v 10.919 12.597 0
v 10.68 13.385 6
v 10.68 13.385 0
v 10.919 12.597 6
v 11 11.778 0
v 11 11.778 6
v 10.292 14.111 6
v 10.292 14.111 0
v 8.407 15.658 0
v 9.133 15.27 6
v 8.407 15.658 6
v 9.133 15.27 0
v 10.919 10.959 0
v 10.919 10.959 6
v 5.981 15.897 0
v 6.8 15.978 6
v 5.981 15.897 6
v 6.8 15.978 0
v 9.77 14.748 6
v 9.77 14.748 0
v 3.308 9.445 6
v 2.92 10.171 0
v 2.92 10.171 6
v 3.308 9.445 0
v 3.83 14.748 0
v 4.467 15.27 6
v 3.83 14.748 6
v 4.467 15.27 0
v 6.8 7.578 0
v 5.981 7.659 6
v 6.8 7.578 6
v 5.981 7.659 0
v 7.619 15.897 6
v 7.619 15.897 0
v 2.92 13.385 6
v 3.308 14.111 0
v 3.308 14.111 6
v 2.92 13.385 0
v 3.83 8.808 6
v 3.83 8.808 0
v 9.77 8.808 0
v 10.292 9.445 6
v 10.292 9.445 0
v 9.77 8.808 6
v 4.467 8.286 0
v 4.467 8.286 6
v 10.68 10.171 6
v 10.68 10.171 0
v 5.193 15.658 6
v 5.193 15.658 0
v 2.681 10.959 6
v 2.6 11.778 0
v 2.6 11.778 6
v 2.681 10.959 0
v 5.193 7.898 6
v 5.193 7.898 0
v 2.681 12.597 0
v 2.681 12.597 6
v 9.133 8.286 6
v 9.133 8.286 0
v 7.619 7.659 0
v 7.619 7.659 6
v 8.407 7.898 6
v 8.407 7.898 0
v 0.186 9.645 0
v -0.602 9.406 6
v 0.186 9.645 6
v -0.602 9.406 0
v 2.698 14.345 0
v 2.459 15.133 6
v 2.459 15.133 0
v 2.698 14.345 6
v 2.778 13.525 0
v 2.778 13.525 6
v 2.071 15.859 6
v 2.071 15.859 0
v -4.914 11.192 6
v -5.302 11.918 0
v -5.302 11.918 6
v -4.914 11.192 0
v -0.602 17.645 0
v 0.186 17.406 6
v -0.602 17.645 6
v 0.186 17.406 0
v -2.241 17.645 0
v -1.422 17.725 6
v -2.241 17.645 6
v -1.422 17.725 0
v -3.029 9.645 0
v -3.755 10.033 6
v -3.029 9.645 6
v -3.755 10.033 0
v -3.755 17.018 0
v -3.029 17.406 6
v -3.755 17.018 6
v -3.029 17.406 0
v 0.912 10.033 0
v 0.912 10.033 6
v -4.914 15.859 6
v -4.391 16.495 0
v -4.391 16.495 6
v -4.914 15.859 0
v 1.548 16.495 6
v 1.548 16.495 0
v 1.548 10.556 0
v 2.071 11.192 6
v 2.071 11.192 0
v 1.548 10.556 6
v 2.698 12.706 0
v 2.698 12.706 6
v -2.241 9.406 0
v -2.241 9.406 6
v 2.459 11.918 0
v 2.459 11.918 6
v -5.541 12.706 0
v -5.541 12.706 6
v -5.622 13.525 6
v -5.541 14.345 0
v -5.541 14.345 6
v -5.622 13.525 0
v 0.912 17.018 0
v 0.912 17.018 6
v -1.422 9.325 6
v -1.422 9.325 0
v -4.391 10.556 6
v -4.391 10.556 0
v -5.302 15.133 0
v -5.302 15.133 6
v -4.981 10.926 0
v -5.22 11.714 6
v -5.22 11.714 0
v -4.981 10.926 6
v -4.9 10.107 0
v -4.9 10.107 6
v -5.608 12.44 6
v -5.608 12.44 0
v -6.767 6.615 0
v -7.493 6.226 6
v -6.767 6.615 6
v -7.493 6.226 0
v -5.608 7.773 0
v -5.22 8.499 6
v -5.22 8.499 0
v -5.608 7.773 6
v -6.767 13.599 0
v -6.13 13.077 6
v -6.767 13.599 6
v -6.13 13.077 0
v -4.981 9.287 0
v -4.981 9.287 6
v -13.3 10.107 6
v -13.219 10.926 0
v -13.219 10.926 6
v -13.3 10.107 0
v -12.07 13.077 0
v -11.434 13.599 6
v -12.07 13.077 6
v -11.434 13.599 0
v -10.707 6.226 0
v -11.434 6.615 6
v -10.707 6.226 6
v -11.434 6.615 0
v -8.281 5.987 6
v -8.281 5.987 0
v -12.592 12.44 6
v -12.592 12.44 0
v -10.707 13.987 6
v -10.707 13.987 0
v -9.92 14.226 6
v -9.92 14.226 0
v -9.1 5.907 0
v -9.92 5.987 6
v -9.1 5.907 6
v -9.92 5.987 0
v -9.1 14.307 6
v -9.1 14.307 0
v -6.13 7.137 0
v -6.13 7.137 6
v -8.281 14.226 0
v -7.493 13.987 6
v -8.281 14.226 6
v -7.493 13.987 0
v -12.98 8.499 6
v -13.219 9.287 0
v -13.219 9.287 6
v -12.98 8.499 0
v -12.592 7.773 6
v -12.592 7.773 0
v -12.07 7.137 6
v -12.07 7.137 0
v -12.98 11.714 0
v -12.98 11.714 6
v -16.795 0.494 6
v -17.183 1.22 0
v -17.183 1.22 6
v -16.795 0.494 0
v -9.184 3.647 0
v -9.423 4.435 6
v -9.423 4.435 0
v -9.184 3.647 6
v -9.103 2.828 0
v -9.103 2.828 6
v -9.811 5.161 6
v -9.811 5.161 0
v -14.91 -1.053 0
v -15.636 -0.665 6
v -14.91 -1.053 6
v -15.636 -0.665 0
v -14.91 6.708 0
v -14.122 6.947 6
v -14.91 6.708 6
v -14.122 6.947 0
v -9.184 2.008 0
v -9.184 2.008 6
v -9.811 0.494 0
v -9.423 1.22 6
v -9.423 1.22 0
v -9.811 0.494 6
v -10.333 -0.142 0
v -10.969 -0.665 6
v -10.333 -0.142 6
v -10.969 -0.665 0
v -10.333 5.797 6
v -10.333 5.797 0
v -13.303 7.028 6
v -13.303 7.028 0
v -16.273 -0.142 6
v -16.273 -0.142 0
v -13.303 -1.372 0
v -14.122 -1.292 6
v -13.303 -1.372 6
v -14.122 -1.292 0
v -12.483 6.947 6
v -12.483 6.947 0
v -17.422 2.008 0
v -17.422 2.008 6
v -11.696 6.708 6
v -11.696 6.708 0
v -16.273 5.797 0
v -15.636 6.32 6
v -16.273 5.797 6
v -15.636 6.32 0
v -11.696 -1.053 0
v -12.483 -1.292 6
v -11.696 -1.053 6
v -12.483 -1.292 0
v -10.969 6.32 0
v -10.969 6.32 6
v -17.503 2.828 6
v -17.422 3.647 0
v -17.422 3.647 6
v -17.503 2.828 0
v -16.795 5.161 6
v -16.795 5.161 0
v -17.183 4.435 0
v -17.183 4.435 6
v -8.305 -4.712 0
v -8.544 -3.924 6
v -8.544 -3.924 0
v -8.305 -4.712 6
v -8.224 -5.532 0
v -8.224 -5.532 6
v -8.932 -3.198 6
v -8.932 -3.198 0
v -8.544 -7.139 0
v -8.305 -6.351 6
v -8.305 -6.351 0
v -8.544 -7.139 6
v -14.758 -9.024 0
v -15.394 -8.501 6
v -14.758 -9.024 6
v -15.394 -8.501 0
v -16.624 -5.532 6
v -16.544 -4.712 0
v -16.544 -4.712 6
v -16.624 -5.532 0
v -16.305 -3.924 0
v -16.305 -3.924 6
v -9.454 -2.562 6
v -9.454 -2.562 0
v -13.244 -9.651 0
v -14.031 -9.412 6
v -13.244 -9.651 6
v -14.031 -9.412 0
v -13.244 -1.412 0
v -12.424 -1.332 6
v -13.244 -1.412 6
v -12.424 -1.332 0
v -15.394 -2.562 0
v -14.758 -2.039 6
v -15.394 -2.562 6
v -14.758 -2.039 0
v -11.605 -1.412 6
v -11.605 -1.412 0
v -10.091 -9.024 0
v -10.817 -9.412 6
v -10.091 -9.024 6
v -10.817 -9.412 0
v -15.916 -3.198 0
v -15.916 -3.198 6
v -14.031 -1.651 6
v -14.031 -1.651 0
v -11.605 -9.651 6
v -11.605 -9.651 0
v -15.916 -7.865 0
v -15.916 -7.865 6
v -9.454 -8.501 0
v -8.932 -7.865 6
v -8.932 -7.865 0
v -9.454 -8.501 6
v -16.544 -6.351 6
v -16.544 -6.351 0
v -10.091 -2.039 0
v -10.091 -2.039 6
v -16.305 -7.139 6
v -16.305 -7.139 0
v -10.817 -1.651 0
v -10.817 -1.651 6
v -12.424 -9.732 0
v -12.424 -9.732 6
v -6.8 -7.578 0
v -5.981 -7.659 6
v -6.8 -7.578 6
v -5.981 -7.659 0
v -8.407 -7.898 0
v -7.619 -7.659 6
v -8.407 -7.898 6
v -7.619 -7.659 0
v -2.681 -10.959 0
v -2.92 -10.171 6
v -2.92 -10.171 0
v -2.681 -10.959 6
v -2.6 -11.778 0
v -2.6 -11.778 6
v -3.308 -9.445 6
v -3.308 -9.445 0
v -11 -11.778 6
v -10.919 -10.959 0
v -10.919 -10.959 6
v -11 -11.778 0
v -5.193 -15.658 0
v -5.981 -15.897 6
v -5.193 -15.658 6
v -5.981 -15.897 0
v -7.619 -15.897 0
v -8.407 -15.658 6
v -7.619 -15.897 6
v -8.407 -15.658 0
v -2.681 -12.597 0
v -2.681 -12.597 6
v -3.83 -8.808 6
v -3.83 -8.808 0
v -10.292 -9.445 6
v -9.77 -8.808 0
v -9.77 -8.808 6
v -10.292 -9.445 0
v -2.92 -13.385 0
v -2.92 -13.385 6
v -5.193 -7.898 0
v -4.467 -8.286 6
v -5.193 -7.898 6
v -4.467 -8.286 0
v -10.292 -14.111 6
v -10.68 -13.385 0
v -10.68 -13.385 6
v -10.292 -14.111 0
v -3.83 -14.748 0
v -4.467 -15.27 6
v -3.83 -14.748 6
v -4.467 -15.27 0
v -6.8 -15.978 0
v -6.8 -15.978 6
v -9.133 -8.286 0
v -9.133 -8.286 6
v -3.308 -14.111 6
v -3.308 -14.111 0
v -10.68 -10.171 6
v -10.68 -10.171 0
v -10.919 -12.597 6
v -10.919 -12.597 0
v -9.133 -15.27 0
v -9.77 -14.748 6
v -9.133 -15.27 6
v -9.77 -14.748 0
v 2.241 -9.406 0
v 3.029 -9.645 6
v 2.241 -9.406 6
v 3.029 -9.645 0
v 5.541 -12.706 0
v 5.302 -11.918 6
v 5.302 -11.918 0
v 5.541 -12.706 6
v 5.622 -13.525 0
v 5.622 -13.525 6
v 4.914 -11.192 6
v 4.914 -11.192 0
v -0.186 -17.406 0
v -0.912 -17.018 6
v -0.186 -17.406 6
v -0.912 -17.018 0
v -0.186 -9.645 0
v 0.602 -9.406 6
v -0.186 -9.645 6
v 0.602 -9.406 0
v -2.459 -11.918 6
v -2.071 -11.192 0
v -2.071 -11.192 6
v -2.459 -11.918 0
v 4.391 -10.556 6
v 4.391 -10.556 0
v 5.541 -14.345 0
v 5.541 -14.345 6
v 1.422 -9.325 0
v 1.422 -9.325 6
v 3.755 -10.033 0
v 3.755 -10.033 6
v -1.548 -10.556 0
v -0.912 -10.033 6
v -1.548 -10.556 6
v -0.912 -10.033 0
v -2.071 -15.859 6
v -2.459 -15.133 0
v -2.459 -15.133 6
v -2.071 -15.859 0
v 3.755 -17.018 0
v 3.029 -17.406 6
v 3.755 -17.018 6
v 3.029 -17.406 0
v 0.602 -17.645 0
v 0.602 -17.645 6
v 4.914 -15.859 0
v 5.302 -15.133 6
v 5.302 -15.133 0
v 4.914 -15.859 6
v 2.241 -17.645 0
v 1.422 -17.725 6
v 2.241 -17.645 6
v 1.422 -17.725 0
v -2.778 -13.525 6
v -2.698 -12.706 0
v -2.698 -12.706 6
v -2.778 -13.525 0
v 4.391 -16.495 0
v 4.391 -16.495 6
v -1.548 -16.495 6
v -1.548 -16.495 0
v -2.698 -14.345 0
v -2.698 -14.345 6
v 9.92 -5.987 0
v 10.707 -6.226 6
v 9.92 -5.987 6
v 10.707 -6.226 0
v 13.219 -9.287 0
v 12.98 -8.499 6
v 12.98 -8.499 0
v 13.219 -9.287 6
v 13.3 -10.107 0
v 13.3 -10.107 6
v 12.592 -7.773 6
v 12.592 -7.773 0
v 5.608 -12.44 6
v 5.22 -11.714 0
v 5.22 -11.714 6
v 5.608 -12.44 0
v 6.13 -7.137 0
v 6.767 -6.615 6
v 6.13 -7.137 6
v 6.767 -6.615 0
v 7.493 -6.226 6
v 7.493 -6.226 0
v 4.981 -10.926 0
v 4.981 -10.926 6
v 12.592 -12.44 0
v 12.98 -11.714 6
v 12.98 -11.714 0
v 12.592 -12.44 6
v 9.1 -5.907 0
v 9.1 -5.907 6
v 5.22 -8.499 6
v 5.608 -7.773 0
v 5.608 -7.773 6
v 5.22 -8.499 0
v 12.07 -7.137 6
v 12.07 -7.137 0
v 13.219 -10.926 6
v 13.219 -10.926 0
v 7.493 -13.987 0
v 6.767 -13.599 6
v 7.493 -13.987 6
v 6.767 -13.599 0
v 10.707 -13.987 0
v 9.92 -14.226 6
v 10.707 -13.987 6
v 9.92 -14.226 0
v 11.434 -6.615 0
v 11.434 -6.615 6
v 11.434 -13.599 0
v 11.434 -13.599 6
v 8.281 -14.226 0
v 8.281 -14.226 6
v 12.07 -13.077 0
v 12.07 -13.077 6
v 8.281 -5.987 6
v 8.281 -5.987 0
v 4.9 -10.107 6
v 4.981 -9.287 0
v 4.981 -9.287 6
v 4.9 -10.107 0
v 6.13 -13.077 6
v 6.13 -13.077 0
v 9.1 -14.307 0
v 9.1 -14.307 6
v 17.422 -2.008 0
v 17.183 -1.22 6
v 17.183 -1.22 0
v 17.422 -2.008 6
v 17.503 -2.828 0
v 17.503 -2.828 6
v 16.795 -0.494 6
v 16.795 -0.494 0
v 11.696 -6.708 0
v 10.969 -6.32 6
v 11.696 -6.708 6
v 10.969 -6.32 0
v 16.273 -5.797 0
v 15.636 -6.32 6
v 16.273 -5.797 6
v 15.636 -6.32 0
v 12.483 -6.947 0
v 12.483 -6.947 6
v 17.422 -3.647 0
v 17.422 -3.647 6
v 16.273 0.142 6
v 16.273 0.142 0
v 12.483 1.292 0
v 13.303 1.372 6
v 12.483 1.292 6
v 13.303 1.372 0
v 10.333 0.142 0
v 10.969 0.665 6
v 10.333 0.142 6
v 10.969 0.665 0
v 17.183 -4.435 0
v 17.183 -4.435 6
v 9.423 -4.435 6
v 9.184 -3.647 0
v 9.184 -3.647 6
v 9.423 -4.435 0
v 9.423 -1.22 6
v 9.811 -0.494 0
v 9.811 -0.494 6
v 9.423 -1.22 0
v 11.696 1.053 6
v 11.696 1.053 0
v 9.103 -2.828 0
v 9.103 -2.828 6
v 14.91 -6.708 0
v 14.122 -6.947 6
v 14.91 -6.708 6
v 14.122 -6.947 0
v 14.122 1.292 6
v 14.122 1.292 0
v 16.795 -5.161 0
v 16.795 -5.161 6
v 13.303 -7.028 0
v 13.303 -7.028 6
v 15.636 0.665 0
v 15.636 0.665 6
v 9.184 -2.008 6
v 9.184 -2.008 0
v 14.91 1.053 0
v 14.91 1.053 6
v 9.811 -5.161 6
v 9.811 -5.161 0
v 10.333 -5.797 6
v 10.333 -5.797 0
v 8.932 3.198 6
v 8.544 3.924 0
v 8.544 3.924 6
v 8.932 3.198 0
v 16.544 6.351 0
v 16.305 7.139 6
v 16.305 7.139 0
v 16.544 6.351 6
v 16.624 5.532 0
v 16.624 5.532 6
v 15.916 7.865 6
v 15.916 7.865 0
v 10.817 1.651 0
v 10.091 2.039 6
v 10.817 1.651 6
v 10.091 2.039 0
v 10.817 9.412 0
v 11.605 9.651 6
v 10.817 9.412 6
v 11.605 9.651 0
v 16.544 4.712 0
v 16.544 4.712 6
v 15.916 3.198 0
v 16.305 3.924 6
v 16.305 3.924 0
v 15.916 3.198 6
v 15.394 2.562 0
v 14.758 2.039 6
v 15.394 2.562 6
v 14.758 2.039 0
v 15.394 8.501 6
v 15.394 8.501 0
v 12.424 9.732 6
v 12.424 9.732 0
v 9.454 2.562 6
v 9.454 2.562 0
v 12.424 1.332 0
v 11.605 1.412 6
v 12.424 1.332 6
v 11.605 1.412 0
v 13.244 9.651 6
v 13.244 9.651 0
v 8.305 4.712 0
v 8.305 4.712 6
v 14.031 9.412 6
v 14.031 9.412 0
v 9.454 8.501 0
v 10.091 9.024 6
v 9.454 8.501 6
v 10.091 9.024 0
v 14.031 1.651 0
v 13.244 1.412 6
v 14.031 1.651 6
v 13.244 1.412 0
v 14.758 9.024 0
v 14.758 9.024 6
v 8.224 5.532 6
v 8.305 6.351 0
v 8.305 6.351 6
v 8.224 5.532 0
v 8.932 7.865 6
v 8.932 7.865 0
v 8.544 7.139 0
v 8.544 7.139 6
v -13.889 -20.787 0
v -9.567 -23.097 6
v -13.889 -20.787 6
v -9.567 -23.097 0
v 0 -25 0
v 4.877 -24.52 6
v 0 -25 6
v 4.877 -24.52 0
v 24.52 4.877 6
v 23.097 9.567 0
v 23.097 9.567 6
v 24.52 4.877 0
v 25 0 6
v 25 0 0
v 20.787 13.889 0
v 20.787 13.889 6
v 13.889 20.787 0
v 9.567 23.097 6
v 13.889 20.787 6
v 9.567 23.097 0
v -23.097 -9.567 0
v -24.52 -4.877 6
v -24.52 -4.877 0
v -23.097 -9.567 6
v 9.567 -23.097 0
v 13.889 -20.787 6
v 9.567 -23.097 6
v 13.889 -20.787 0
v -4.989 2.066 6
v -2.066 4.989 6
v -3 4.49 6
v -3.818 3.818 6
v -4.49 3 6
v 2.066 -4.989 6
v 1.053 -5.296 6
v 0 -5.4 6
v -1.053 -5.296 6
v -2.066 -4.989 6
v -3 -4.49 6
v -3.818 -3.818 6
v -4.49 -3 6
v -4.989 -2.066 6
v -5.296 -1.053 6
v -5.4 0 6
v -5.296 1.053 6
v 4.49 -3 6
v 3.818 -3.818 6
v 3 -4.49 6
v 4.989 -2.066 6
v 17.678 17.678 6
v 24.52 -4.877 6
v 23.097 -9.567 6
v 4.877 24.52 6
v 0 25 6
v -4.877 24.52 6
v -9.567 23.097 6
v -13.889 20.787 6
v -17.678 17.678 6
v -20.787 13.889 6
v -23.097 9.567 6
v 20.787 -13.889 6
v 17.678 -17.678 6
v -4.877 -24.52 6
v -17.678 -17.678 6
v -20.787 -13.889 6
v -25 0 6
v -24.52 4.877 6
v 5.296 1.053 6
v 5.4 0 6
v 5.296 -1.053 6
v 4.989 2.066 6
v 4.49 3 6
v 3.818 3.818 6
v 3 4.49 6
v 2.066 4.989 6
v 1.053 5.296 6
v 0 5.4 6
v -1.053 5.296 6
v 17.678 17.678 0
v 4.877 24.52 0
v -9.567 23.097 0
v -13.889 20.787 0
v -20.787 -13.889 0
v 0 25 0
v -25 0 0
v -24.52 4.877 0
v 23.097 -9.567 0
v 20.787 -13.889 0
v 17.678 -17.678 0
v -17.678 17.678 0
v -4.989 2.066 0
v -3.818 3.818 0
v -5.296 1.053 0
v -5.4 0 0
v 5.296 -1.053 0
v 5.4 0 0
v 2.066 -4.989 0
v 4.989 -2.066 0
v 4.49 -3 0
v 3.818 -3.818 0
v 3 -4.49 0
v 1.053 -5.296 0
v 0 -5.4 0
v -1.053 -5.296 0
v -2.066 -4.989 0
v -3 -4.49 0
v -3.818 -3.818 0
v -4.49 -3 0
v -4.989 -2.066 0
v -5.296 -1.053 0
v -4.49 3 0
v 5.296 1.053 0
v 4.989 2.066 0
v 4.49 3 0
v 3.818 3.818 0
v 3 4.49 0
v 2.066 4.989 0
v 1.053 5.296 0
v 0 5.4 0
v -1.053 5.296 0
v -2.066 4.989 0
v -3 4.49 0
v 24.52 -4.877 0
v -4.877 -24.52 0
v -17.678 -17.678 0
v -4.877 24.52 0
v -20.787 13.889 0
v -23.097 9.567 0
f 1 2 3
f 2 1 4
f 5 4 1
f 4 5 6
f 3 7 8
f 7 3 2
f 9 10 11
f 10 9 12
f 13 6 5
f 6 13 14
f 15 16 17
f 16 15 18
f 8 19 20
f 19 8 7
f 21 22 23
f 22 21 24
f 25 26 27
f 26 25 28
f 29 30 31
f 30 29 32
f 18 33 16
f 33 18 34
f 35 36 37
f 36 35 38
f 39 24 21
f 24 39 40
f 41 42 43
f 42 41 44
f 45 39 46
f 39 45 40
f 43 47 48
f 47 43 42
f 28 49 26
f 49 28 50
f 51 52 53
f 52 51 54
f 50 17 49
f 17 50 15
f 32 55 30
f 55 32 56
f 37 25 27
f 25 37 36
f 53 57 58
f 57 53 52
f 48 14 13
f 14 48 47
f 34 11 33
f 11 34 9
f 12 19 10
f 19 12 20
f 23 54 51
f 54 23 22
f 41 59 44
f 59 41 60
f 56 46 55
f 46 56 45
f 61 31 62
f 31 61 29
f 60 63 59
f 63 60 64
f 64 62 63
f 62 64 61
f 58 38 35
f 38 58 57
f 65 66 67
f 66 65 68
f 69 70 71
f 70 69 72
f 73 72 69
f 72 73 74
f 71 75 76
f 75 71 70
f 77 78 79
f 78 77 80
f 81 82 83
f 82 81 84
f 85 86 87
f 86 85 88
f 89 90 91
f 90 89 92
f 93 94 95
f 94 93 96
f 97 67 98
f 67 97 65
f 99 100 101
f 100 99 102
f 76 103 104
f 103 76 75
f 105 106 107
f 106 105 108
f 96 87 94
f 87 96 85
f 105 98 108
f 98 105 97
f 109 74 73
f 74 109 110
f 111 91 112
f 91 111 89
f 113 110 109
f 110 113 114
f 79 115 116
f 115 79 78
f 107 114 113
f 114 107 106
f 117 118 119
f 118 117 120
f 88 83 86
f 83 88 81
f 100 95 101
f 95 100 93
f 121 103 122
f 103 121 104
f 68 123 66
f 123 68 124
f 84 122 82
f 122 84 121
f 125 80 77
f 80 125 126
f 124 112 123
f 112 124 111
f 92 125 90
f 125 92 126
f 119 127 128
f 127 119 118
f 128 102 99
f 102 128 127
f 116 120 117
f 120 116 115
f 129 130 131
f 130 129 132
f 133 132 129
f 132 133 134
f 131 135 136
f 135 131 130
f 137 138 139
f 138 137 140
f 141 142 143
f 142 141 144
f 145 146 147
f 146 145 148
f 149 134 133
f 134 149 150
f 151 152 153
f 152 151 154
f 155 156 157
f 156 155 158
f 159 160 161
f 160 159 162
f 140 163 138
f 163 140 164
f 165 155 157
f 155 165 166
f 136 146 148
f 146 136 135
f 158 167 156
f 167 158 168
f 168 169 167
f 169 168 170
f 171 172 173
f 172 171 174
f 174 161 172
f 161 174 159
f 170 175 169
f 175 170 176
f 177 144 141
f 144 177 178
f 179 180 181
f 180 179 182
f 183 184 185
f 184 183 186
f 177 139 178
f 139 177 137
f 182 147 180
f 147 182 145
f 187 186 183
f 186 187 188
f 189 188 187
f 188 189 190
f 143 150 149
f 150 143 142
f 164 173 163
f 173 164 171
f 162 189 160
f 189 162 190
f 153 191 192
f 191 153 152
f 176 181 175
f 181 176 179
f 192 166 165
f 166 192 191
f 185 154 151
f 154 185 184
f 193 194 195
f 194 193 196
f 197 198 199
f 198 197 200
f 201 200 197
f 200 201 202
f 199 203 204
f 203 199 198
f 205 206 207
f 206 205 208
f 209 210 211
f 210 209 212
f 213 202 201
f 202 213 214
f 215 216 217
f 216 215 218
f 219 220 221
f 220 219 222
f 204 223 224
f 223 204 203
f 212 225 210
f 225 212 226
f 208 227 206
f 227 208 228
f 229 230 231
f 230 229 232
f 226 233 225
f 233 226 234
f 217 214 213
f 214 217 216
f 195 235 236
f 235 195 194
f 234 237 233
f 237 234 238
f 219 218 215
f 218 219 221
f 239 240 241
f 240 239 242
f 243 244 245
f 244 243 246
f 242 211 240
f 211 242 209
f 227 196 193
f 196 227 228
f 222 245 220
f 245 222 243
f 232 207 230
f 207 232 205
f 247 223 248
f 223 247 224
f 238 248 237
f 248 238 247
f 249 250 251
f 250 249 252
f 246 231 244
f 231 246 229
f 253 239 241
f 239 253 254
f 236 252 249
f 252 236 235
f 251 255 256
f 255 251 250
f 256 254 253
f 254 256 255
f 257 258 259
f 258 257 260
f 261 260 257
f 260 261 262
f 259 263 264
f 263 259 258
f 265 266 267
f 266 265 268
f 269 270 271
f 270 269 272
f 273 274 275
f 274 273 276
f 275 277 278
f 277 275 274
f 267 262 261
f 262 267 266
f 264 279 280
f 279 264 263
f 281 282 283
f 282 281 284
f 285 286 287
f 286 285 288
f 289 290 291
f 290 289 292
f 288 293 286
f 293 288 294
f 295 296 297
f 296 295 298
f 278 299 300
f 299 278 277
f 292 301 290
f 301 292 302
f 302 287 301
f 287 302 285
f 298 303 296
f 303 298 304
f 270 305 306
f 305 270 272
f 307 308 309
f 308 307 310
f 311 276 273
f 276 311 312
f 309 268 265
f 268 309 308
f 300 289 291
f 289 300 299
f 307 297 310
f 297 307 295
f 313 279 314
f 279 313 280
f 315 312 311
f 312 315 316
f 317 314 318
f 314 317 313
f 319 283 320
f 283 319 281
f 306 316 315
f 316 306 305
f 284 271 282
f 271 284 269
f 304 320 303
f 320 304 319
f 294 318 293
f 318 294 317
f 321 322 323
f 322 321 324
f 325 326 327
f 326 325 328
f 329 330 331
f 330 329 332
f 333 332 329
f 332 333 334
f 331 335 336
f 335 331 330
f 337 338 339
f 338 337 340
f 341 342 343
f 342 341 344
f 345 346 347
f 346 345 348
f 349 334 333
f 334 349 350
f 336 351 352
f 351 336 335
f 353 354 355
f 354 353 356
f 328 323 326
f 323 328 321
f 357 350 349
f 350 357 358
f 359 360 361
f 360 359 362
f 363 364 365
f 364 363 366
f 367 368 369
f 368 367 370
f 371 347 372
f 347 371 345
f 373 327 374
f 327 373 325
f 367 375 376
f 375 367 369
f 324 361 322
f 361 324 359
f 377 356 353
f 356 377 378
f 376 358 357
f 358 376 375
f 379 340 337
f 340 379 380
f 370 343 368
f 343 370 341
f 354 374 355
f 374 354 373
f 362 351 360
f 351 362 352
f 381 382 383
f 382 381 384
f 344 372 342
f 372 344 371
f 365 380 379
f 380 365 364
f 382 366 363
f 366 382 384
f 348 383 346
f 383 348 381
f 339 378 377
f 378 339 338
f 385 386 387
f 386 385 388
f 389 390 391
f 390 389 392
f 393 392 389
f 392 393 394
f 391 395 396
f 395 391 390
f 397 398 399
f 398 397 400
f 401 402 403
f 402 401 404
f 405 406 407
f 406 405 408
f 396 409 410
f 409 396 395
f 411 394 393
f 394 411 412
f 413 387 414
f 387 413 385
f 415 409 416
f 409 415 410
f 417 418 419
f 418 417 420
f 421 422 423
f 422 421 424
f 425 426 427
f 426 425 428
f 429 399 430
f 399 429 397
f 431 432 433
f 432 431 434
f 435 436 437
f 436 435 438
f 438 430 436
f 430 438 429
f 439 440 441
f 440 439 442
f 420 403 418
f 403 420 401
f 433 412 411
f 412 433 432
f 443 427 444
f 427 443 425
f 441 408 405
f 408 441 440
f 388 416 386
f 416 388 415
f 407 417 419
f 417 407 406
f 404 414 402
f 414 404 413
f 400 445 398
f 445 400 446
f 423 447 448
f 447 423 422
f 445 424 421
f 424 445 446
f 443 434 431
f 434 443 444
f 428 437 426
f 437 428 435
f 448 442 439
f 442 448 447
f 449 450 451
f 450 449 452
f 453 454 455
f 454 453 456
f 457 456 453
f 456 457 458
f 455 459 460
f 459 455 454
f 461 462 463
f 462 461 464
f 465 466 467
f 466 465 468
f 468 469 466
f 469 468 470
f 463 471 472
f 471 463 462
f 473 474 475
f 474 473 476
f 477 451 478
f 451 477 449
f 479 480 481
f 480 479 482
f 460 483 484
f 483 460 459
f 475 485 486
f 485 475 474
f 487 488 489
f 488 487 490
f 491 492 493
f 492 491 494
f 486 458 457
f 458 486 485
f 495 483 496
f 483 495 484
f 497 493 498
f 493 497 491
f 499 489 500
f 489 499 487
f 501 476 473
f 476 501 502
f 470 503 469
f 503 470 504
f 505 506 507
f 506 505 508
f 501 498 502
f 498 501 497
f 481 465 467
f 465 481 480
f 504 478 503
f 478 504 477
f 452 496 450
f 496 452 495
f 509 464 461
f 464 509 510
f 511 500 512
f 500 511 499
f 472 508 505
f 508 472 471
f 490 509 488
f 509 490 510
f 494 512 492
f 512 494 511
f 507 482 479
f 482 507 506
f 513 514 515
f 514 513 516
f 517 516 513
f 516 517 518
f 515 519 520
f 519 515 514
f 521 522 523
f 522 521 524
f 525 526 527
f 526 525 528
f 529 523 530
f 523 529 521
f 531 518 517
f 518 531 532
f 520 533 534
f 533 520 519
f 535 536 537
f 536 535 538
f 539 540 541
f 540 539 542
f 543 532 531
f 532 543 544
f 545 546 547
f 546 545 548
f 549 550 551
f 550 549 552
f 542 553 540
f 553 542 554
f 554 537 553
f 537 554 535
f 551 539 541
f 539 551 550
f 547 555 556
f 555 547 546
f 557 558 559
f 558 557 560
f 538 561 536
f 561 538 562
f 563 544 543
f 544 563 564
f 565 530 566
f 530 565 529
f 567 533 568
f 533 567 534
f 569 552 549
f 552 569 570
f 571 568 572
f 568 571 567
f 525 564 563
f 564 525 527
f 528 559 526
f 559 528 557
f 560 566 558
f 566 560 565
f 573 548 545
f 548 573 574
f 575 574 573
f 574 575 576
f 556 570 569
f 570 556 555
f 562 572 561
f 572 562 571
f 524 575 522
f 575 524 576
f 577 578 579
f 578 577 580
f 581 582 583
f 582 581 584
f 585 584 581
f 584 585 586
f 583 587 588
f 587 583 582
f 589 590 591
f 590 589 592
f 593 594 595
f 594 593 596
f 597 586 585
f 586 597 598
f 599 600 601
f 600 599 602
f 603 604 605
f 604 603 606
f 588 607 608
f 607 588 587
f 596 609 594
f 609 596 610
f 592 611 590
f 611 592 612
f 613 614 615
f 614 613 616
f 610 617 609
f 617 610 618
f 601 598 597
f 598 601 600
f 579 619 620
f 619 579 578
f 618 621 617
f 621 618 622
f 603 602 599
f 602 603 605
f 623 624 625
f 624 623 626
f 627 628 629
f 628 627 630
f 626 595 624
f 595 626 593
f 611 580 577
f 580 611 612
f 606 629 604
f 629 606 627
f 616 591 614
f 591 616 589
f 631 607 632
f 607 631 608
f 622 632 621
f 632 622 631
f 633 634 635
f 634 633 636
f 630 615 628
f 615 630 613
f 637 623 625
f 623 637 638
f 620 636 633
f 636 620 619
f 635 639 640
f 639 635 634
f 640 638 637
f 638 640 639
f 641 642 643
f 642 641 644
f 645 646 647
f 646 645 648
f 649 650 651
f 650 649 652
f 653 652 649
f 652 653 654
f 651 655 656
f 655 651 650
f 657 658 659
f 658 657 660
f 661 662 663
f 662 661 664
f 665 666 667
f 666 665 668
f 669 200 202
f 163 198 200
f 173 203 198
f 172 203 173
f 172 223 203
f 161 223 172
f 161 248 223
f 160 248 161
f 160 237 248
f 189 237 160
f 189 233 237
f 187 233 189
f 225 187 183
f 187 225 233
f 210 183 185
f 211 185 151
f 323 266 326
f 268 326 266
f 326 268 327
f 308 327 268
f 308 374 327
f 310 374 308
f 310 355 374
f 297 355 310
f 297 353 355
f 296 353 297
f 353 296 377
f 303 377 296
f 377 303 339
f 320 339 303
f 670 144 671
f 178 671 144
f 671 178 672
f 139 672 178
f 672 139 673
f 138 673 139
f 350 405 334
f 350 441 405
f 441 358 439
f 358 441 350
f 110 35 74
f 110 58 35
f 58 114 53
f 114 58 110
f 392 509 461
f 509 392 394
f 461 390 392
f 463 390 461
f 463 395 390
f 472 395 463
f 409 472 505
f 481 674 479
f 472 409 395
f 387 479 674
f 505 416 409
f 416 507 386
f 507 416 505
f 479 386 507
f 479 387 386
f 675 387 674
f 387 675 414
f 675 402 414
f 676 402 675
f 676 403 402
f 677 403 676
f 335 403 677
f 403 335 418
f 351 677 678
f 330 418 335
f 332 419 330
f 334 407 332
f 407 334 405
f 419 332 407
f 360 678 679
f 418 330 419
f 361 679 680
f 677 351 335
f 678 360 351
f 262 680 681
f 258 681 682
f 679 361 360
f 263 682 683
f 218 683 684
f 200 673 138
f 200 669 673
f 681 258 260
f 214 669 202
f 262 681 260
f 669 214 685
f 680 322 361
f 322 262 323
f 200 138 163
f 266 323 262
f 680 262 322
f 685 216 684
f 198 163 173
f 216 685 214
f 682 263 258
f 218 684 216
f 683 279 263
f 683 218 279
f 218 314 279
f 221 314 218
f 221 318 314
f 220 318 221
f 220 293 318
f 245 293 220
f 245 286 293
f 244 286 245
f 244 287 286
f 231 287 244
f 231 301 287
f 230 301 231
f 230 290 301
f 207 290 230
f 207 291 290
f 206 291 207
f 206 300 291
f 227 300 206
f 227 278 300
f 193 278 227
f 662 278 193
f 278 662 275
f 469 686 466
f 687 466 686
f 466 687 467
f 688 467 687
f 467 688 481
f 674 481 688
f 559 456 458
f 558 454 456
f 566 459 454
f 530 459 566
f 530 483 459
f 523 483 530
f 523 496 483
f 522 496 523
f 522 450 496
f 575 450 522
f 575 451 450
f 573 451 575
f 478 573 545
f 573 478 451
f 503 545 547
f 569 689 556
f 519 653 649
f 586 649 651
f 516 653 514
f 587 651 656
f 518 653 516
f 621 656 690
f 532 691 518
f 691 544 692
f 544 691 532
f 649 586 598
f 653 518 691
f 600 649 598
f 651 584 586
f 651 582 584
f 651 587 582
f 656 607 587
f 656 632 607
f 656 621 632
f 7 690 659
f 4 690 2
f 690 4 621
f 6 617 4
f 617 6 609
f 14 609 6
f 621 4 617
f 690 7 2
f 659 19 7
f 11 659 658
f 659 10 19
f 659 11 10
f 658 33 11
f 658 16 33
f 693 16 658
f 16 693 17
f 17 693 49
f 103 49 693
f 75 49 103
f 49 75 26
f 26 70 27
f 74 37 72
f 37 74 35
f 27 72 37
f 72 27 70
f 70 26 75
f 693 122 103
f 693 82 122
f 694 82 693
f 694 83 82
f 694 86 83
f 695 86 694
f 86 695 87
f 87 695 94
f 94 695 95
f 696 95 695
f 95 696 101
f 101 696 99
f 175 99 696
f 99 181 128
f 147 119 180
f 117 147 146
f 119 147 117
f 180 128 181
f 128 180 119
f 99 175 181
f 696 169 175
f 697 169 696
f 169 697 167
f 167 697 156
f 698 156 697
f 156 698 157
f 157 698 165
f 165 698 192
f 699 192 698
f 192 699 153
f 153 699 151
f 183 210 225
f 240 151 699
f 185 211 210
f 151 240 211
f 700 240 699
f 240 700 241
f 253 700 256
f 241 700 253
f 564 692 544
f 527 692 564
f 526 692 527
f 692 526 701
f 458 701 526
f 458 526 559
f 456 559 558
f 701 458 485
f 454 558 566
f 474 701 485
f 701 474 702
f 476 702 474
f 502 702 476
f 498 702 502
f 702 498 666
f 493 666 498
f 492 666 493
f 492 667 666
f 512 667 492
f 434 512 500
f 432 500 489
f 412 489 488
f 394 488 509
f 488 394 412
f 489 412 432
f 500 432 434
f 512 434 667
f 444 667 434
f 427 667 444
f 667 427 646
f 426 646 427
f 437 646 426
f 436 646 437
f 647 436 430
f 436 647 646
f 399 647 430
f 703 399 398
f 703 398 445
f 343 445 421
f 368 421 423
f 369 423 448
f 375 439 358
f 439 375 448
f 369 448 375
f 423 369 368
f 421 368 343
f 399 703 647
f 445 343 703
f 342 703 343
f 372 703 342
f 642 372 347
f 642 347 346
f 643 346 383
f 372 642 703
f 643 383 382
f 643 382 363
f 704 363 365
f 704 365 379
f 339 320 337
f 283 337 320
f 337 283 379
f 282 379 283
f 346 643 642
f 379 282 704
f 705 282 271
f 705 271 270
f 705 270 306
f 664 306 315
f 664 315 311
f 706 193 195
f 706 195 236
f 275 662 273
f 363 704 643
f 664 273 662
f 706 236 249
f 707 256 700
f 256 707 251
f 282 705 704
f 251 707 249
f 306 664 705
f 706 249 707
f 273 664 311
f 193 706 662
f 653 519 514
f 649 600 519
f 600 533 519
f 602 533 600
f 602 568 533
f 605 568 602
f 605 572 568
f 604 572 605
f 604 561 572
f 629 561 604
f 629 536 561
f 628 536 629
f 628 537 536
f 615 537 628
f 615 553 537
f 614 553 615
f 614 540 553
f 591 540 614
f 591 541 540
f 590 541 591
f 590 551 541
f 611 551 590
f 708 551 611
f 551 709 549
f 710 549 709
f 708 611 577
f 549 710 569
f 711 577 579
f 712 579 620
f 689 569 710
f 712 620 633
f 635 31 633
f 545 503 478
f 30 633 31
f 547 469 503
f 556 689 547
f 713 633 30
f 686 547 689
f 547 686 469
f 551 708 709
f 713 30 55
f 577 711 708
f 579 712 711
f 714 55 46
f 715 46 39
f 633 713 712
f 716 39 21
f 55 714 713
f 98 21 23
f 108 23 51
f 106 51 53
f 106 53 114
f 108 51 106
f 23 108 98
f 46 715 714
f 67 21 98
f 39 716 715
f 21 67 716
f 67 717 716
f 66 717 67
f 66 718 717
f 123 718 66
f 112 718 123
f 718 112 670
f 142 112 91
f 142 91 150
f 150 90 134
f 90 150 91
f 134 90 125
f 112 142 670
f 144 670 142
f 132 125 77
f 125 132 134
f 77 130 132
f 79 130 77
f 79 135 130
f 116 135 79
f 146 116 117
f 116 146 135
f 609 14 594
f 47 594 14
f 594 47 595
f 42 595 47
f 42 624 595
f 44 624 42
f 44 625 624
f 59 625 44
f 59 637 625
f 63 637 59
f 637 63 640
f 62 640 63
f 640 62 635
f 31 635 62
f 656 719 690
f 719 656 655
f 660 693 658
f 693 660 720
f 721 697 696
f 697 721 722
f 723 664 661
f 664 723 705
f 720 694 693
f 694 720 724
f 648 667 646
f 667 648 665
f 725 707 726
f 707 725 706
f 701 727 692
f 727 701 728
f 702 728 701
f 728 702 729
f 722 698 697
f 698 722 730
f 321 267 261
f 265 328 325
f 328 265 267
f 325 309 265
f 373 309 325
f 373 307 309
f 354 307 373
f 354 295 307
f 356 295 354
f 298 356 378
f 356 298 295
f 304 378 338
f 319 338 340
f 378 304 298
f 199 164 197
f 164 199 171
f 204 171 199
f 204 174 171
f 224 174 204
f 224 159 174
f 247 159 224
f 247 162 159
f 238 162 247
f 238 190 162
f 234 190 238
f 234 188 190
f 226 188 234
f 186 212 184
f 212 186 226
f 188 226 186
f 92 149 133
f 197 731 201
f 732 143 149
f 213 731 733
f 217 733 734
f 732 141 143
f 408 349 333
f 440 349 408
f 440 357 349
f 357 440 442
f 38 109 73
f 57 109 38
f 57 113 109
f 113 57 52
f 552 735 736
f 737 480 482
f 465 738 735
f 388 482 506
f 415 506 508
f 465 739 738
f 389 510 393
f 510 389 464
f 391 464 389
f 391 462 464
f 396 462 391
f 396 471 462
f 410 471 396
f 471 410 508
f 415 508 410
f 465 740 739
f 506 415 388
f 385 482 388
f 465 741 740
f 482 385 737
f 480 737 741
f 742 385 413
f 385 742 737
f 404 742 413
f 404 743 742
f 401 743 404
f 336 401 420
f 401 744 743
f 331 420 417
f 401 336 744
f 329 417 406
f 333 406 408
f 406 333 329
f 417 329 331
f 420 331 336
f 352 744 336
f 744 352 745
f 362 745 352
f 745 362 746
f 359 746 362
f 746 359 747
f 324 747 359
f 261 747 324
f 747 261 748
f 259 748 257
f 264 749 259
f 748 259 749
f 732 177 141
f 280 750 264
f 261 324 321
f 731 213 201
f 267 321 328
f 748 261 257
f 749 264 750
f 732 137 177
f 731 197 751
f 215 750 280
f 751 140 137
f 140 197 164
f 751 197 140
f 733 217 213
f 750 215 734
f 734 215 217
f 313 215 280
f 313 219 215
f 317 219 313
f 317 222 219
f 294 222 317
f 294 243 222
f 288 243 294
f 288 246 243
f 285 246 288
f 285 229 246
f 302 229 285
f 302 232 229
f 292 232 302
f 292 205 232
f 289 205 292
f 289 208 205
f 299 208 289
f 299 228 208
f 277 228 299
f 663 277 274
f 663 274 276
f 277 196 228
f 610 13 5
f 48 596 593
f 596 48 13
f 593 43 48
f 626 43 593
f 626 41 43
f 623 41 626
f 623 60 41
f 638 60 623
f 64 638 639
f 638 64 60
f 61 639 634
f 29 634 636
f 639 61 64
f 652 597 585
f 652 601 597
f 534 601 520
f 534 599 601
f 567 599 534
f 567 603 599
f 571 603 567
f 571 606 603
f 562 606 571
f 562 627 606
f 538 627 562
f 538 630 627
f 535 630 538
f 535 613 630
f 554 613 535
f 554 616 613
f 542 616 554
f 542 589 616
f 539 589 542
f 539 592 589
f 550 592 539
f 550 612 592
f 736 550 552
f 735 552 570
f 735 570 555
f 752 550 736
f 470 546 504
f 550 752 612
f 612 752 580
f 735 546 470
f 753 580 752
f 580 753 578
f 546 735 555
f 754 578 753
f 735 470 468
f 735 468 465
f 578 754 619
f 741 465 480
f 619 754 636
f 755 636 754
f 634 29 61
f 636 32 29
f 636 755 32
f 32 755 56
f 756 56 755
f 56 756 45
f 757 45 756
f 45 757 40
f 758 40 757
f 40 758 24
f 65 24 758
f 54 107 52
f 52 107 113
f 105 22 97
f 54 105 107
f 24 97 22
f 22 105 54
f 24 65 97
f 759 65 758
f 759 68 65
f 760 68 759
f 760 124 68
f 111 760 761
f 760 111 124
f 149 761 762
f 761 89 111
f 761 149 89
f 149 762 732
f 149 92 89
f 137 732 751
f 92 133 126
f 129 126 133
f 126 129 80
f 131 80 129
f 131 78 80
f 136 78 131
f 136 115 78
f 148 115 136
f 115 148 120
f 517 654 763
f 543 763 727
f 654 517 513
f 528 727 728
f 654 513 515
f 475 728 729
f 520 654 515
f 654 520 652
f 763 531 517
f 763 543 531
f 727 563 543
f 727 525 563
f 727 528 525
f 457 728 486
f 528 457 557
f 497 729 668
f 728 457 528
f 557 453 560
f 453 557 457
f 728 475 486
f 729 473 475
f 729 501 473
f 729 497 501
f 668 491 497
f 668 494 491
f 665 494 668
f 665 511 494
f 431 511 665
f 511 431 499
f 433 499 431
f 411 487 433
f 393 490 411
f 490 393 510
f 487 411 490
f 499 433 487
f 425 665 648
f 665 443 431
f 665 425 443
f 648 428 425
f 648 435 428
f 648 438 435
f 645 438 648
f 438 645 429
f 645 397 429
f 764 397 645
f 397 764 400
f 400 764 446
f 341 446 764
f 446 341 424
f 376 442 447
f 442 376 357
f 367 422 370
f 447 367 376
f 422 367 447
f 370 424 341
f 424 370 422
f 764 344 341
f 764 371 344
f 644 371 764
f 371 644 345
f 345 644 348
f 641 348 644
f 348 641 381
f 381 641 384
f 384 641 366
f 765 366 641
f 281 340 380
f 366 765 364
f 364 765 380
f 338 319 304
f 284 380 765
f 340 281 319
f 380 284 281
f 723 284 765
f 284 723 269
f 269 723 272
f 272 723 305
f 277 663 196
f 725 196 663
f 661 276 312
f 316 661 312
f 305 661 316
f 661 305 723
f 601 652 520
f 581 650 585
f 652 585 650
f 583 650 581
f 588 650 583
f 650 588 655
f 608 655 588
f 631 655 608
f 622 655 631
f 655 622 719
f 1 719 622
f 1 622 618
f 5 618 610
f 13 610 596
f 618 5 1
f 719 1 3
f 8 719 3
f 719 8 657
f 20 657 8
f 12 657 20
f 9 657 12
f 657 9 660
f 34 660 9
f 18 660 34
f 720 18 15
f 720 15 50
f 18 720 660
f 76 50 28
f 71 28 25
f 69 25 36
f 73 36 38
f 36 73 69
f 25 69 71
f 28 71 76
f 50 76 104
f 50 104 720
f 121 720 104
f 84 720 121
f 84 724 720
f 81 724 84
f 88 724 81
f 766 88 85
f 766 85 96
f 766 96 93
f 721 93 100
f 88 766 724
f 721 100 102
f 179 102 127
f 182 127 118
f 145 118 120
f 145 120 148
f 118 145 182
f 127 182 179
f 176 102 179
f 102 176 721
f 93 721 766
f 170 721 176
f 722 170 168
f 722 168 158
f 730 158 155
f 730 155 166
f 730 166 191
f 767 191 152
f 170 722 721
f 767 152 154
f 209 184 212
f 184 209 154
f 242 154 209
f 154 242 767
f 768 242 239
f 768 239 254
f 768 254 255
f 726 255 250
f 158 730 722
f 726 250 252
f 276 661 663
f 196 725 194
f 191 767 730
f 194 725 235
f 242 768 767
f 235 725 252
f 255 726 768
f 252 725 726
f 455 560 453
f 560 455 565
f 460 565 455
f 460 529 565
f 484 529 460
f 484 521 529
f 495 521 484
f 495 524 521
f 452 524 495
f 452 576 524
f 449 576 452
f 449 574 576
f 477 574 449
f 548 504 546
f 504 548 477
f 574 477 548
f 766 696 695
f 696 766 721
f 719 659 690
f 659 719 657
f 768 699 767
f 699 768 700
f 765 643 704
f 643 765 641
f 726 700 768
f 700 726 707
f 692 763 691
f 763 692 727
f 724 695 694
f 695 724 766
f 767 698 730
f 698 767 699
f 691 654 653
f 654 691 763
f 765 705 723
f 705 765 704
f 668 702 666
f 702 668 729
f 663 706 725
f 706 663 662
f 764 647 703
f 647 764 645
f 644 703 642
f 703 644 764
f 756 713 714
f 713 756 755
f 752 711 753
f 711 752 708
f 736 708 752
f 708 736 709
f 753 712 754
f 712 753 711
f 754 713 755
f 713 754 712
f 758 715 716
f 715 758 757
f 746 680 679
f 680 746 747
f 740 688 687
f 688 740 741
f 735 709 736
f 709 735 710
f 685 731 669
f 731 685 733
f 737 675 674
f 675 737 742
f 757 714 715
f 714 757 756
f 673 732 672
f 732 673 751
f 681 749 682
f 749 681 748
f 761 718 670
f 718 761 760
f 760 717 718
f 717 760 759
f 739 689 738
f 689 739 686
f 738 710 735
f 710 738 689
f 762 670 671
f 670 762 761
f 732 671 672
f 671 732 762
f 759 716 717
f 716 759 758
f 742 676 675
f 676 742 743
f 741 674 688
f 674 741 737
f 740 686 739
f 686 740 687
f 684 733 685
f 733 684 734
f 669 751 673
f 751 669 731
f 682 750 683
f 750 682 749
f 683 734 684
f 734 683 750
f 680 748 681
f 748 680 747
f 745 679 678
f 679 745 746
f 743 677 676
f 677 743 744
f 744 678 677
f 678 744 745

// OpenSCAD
$fn = 32;

// ----------------------------------------------------------------------
// Flange Ø50 x 6
// 10 holes on a Ø27.2 bolt circle, bolted joints
// ----------------------------------------------------------------------

// --- parameters (mm) ---
flange_d = 50;   // outside diameter of the flange
thickness = 6;   // flange thickness
holes = 10;      // number of bolt holes
pcd = 27.2;      // bolt circle diameter
start_deg = 60;  // angle of the first hole, from +X
hole_d = 8.4;    // bolt hole diameter
bore_d = 10.8;   // central through bore
hub_d = 22.8;    // hub outside diameter
hub_h = 0;       // hub height above the flange face (0 = no hub)

// --- derived feature positions (mm) ---
height = thickness + hub_h;  // = 6   overall height of the part
pcd_r = pcd / 2;             // = 13.6   bolt circle radius
hole_step = 360 / holes;     // = 36   angular pitch
feature_centers = [
  [pcd_r * cos(start_deg + 0 * hole_step), pcd_r * sin(start_deg + 0 * hole_step)],
  [pcd_r * cos(start_deg + 1 * hole_step), pcd_r * sin(start_deg + 1 * hole_step)],
  [pcd_r * cos(start_deg + 2 * hole_step), pcd_r * sin(start_deg + 2 * hole_step)],
  [pcd_r * cos(start_deg + 3 * hole_step), pcd_r * sin(start_deg + 3 * hole_step)],
  [pcd_r * cos(start_deg + 4 * hole_step), pcd_r * sin(start_deg + 4 * hole_step)],
  [pcd_r * cos(start_deg + 5 * hole_step), pcd_r * sin(start_deg + 5 * hole_step)],
  [pcd_r * cos(start_deg + 6 * hole_step), pcd_r * sin(start_deg + 6 * hole_step)],
  [pcd_r * cos(start_deg + 7 * hole_step), pcd_r * sin(start_deg + 7 * hole_step)],
  [pcd_r * cos(start_deg + 8 * hole_step), pcd_r * sin(start_deg + 8 * hole_step)],
  [pcd_r * cos(start_deg + 9 * hole_step), pcd_r * sin(start_deg + 9 * hole_step)]
];   // bolt hole centres on the pitch circle

// flange disc, every hole and the bore cut straight through
difference() {
  union() {
    cylinder(d = flange_d, h = thickness);
  }
  translate([0, 0, -1]) cylinder(d = bore_d, h = height + 2);  // bore, through
  for (centre = feature_centers)
    translate([centre[0], centre[1], -1]) cylinder(d = hole_d, h = thickness + 2);
}
